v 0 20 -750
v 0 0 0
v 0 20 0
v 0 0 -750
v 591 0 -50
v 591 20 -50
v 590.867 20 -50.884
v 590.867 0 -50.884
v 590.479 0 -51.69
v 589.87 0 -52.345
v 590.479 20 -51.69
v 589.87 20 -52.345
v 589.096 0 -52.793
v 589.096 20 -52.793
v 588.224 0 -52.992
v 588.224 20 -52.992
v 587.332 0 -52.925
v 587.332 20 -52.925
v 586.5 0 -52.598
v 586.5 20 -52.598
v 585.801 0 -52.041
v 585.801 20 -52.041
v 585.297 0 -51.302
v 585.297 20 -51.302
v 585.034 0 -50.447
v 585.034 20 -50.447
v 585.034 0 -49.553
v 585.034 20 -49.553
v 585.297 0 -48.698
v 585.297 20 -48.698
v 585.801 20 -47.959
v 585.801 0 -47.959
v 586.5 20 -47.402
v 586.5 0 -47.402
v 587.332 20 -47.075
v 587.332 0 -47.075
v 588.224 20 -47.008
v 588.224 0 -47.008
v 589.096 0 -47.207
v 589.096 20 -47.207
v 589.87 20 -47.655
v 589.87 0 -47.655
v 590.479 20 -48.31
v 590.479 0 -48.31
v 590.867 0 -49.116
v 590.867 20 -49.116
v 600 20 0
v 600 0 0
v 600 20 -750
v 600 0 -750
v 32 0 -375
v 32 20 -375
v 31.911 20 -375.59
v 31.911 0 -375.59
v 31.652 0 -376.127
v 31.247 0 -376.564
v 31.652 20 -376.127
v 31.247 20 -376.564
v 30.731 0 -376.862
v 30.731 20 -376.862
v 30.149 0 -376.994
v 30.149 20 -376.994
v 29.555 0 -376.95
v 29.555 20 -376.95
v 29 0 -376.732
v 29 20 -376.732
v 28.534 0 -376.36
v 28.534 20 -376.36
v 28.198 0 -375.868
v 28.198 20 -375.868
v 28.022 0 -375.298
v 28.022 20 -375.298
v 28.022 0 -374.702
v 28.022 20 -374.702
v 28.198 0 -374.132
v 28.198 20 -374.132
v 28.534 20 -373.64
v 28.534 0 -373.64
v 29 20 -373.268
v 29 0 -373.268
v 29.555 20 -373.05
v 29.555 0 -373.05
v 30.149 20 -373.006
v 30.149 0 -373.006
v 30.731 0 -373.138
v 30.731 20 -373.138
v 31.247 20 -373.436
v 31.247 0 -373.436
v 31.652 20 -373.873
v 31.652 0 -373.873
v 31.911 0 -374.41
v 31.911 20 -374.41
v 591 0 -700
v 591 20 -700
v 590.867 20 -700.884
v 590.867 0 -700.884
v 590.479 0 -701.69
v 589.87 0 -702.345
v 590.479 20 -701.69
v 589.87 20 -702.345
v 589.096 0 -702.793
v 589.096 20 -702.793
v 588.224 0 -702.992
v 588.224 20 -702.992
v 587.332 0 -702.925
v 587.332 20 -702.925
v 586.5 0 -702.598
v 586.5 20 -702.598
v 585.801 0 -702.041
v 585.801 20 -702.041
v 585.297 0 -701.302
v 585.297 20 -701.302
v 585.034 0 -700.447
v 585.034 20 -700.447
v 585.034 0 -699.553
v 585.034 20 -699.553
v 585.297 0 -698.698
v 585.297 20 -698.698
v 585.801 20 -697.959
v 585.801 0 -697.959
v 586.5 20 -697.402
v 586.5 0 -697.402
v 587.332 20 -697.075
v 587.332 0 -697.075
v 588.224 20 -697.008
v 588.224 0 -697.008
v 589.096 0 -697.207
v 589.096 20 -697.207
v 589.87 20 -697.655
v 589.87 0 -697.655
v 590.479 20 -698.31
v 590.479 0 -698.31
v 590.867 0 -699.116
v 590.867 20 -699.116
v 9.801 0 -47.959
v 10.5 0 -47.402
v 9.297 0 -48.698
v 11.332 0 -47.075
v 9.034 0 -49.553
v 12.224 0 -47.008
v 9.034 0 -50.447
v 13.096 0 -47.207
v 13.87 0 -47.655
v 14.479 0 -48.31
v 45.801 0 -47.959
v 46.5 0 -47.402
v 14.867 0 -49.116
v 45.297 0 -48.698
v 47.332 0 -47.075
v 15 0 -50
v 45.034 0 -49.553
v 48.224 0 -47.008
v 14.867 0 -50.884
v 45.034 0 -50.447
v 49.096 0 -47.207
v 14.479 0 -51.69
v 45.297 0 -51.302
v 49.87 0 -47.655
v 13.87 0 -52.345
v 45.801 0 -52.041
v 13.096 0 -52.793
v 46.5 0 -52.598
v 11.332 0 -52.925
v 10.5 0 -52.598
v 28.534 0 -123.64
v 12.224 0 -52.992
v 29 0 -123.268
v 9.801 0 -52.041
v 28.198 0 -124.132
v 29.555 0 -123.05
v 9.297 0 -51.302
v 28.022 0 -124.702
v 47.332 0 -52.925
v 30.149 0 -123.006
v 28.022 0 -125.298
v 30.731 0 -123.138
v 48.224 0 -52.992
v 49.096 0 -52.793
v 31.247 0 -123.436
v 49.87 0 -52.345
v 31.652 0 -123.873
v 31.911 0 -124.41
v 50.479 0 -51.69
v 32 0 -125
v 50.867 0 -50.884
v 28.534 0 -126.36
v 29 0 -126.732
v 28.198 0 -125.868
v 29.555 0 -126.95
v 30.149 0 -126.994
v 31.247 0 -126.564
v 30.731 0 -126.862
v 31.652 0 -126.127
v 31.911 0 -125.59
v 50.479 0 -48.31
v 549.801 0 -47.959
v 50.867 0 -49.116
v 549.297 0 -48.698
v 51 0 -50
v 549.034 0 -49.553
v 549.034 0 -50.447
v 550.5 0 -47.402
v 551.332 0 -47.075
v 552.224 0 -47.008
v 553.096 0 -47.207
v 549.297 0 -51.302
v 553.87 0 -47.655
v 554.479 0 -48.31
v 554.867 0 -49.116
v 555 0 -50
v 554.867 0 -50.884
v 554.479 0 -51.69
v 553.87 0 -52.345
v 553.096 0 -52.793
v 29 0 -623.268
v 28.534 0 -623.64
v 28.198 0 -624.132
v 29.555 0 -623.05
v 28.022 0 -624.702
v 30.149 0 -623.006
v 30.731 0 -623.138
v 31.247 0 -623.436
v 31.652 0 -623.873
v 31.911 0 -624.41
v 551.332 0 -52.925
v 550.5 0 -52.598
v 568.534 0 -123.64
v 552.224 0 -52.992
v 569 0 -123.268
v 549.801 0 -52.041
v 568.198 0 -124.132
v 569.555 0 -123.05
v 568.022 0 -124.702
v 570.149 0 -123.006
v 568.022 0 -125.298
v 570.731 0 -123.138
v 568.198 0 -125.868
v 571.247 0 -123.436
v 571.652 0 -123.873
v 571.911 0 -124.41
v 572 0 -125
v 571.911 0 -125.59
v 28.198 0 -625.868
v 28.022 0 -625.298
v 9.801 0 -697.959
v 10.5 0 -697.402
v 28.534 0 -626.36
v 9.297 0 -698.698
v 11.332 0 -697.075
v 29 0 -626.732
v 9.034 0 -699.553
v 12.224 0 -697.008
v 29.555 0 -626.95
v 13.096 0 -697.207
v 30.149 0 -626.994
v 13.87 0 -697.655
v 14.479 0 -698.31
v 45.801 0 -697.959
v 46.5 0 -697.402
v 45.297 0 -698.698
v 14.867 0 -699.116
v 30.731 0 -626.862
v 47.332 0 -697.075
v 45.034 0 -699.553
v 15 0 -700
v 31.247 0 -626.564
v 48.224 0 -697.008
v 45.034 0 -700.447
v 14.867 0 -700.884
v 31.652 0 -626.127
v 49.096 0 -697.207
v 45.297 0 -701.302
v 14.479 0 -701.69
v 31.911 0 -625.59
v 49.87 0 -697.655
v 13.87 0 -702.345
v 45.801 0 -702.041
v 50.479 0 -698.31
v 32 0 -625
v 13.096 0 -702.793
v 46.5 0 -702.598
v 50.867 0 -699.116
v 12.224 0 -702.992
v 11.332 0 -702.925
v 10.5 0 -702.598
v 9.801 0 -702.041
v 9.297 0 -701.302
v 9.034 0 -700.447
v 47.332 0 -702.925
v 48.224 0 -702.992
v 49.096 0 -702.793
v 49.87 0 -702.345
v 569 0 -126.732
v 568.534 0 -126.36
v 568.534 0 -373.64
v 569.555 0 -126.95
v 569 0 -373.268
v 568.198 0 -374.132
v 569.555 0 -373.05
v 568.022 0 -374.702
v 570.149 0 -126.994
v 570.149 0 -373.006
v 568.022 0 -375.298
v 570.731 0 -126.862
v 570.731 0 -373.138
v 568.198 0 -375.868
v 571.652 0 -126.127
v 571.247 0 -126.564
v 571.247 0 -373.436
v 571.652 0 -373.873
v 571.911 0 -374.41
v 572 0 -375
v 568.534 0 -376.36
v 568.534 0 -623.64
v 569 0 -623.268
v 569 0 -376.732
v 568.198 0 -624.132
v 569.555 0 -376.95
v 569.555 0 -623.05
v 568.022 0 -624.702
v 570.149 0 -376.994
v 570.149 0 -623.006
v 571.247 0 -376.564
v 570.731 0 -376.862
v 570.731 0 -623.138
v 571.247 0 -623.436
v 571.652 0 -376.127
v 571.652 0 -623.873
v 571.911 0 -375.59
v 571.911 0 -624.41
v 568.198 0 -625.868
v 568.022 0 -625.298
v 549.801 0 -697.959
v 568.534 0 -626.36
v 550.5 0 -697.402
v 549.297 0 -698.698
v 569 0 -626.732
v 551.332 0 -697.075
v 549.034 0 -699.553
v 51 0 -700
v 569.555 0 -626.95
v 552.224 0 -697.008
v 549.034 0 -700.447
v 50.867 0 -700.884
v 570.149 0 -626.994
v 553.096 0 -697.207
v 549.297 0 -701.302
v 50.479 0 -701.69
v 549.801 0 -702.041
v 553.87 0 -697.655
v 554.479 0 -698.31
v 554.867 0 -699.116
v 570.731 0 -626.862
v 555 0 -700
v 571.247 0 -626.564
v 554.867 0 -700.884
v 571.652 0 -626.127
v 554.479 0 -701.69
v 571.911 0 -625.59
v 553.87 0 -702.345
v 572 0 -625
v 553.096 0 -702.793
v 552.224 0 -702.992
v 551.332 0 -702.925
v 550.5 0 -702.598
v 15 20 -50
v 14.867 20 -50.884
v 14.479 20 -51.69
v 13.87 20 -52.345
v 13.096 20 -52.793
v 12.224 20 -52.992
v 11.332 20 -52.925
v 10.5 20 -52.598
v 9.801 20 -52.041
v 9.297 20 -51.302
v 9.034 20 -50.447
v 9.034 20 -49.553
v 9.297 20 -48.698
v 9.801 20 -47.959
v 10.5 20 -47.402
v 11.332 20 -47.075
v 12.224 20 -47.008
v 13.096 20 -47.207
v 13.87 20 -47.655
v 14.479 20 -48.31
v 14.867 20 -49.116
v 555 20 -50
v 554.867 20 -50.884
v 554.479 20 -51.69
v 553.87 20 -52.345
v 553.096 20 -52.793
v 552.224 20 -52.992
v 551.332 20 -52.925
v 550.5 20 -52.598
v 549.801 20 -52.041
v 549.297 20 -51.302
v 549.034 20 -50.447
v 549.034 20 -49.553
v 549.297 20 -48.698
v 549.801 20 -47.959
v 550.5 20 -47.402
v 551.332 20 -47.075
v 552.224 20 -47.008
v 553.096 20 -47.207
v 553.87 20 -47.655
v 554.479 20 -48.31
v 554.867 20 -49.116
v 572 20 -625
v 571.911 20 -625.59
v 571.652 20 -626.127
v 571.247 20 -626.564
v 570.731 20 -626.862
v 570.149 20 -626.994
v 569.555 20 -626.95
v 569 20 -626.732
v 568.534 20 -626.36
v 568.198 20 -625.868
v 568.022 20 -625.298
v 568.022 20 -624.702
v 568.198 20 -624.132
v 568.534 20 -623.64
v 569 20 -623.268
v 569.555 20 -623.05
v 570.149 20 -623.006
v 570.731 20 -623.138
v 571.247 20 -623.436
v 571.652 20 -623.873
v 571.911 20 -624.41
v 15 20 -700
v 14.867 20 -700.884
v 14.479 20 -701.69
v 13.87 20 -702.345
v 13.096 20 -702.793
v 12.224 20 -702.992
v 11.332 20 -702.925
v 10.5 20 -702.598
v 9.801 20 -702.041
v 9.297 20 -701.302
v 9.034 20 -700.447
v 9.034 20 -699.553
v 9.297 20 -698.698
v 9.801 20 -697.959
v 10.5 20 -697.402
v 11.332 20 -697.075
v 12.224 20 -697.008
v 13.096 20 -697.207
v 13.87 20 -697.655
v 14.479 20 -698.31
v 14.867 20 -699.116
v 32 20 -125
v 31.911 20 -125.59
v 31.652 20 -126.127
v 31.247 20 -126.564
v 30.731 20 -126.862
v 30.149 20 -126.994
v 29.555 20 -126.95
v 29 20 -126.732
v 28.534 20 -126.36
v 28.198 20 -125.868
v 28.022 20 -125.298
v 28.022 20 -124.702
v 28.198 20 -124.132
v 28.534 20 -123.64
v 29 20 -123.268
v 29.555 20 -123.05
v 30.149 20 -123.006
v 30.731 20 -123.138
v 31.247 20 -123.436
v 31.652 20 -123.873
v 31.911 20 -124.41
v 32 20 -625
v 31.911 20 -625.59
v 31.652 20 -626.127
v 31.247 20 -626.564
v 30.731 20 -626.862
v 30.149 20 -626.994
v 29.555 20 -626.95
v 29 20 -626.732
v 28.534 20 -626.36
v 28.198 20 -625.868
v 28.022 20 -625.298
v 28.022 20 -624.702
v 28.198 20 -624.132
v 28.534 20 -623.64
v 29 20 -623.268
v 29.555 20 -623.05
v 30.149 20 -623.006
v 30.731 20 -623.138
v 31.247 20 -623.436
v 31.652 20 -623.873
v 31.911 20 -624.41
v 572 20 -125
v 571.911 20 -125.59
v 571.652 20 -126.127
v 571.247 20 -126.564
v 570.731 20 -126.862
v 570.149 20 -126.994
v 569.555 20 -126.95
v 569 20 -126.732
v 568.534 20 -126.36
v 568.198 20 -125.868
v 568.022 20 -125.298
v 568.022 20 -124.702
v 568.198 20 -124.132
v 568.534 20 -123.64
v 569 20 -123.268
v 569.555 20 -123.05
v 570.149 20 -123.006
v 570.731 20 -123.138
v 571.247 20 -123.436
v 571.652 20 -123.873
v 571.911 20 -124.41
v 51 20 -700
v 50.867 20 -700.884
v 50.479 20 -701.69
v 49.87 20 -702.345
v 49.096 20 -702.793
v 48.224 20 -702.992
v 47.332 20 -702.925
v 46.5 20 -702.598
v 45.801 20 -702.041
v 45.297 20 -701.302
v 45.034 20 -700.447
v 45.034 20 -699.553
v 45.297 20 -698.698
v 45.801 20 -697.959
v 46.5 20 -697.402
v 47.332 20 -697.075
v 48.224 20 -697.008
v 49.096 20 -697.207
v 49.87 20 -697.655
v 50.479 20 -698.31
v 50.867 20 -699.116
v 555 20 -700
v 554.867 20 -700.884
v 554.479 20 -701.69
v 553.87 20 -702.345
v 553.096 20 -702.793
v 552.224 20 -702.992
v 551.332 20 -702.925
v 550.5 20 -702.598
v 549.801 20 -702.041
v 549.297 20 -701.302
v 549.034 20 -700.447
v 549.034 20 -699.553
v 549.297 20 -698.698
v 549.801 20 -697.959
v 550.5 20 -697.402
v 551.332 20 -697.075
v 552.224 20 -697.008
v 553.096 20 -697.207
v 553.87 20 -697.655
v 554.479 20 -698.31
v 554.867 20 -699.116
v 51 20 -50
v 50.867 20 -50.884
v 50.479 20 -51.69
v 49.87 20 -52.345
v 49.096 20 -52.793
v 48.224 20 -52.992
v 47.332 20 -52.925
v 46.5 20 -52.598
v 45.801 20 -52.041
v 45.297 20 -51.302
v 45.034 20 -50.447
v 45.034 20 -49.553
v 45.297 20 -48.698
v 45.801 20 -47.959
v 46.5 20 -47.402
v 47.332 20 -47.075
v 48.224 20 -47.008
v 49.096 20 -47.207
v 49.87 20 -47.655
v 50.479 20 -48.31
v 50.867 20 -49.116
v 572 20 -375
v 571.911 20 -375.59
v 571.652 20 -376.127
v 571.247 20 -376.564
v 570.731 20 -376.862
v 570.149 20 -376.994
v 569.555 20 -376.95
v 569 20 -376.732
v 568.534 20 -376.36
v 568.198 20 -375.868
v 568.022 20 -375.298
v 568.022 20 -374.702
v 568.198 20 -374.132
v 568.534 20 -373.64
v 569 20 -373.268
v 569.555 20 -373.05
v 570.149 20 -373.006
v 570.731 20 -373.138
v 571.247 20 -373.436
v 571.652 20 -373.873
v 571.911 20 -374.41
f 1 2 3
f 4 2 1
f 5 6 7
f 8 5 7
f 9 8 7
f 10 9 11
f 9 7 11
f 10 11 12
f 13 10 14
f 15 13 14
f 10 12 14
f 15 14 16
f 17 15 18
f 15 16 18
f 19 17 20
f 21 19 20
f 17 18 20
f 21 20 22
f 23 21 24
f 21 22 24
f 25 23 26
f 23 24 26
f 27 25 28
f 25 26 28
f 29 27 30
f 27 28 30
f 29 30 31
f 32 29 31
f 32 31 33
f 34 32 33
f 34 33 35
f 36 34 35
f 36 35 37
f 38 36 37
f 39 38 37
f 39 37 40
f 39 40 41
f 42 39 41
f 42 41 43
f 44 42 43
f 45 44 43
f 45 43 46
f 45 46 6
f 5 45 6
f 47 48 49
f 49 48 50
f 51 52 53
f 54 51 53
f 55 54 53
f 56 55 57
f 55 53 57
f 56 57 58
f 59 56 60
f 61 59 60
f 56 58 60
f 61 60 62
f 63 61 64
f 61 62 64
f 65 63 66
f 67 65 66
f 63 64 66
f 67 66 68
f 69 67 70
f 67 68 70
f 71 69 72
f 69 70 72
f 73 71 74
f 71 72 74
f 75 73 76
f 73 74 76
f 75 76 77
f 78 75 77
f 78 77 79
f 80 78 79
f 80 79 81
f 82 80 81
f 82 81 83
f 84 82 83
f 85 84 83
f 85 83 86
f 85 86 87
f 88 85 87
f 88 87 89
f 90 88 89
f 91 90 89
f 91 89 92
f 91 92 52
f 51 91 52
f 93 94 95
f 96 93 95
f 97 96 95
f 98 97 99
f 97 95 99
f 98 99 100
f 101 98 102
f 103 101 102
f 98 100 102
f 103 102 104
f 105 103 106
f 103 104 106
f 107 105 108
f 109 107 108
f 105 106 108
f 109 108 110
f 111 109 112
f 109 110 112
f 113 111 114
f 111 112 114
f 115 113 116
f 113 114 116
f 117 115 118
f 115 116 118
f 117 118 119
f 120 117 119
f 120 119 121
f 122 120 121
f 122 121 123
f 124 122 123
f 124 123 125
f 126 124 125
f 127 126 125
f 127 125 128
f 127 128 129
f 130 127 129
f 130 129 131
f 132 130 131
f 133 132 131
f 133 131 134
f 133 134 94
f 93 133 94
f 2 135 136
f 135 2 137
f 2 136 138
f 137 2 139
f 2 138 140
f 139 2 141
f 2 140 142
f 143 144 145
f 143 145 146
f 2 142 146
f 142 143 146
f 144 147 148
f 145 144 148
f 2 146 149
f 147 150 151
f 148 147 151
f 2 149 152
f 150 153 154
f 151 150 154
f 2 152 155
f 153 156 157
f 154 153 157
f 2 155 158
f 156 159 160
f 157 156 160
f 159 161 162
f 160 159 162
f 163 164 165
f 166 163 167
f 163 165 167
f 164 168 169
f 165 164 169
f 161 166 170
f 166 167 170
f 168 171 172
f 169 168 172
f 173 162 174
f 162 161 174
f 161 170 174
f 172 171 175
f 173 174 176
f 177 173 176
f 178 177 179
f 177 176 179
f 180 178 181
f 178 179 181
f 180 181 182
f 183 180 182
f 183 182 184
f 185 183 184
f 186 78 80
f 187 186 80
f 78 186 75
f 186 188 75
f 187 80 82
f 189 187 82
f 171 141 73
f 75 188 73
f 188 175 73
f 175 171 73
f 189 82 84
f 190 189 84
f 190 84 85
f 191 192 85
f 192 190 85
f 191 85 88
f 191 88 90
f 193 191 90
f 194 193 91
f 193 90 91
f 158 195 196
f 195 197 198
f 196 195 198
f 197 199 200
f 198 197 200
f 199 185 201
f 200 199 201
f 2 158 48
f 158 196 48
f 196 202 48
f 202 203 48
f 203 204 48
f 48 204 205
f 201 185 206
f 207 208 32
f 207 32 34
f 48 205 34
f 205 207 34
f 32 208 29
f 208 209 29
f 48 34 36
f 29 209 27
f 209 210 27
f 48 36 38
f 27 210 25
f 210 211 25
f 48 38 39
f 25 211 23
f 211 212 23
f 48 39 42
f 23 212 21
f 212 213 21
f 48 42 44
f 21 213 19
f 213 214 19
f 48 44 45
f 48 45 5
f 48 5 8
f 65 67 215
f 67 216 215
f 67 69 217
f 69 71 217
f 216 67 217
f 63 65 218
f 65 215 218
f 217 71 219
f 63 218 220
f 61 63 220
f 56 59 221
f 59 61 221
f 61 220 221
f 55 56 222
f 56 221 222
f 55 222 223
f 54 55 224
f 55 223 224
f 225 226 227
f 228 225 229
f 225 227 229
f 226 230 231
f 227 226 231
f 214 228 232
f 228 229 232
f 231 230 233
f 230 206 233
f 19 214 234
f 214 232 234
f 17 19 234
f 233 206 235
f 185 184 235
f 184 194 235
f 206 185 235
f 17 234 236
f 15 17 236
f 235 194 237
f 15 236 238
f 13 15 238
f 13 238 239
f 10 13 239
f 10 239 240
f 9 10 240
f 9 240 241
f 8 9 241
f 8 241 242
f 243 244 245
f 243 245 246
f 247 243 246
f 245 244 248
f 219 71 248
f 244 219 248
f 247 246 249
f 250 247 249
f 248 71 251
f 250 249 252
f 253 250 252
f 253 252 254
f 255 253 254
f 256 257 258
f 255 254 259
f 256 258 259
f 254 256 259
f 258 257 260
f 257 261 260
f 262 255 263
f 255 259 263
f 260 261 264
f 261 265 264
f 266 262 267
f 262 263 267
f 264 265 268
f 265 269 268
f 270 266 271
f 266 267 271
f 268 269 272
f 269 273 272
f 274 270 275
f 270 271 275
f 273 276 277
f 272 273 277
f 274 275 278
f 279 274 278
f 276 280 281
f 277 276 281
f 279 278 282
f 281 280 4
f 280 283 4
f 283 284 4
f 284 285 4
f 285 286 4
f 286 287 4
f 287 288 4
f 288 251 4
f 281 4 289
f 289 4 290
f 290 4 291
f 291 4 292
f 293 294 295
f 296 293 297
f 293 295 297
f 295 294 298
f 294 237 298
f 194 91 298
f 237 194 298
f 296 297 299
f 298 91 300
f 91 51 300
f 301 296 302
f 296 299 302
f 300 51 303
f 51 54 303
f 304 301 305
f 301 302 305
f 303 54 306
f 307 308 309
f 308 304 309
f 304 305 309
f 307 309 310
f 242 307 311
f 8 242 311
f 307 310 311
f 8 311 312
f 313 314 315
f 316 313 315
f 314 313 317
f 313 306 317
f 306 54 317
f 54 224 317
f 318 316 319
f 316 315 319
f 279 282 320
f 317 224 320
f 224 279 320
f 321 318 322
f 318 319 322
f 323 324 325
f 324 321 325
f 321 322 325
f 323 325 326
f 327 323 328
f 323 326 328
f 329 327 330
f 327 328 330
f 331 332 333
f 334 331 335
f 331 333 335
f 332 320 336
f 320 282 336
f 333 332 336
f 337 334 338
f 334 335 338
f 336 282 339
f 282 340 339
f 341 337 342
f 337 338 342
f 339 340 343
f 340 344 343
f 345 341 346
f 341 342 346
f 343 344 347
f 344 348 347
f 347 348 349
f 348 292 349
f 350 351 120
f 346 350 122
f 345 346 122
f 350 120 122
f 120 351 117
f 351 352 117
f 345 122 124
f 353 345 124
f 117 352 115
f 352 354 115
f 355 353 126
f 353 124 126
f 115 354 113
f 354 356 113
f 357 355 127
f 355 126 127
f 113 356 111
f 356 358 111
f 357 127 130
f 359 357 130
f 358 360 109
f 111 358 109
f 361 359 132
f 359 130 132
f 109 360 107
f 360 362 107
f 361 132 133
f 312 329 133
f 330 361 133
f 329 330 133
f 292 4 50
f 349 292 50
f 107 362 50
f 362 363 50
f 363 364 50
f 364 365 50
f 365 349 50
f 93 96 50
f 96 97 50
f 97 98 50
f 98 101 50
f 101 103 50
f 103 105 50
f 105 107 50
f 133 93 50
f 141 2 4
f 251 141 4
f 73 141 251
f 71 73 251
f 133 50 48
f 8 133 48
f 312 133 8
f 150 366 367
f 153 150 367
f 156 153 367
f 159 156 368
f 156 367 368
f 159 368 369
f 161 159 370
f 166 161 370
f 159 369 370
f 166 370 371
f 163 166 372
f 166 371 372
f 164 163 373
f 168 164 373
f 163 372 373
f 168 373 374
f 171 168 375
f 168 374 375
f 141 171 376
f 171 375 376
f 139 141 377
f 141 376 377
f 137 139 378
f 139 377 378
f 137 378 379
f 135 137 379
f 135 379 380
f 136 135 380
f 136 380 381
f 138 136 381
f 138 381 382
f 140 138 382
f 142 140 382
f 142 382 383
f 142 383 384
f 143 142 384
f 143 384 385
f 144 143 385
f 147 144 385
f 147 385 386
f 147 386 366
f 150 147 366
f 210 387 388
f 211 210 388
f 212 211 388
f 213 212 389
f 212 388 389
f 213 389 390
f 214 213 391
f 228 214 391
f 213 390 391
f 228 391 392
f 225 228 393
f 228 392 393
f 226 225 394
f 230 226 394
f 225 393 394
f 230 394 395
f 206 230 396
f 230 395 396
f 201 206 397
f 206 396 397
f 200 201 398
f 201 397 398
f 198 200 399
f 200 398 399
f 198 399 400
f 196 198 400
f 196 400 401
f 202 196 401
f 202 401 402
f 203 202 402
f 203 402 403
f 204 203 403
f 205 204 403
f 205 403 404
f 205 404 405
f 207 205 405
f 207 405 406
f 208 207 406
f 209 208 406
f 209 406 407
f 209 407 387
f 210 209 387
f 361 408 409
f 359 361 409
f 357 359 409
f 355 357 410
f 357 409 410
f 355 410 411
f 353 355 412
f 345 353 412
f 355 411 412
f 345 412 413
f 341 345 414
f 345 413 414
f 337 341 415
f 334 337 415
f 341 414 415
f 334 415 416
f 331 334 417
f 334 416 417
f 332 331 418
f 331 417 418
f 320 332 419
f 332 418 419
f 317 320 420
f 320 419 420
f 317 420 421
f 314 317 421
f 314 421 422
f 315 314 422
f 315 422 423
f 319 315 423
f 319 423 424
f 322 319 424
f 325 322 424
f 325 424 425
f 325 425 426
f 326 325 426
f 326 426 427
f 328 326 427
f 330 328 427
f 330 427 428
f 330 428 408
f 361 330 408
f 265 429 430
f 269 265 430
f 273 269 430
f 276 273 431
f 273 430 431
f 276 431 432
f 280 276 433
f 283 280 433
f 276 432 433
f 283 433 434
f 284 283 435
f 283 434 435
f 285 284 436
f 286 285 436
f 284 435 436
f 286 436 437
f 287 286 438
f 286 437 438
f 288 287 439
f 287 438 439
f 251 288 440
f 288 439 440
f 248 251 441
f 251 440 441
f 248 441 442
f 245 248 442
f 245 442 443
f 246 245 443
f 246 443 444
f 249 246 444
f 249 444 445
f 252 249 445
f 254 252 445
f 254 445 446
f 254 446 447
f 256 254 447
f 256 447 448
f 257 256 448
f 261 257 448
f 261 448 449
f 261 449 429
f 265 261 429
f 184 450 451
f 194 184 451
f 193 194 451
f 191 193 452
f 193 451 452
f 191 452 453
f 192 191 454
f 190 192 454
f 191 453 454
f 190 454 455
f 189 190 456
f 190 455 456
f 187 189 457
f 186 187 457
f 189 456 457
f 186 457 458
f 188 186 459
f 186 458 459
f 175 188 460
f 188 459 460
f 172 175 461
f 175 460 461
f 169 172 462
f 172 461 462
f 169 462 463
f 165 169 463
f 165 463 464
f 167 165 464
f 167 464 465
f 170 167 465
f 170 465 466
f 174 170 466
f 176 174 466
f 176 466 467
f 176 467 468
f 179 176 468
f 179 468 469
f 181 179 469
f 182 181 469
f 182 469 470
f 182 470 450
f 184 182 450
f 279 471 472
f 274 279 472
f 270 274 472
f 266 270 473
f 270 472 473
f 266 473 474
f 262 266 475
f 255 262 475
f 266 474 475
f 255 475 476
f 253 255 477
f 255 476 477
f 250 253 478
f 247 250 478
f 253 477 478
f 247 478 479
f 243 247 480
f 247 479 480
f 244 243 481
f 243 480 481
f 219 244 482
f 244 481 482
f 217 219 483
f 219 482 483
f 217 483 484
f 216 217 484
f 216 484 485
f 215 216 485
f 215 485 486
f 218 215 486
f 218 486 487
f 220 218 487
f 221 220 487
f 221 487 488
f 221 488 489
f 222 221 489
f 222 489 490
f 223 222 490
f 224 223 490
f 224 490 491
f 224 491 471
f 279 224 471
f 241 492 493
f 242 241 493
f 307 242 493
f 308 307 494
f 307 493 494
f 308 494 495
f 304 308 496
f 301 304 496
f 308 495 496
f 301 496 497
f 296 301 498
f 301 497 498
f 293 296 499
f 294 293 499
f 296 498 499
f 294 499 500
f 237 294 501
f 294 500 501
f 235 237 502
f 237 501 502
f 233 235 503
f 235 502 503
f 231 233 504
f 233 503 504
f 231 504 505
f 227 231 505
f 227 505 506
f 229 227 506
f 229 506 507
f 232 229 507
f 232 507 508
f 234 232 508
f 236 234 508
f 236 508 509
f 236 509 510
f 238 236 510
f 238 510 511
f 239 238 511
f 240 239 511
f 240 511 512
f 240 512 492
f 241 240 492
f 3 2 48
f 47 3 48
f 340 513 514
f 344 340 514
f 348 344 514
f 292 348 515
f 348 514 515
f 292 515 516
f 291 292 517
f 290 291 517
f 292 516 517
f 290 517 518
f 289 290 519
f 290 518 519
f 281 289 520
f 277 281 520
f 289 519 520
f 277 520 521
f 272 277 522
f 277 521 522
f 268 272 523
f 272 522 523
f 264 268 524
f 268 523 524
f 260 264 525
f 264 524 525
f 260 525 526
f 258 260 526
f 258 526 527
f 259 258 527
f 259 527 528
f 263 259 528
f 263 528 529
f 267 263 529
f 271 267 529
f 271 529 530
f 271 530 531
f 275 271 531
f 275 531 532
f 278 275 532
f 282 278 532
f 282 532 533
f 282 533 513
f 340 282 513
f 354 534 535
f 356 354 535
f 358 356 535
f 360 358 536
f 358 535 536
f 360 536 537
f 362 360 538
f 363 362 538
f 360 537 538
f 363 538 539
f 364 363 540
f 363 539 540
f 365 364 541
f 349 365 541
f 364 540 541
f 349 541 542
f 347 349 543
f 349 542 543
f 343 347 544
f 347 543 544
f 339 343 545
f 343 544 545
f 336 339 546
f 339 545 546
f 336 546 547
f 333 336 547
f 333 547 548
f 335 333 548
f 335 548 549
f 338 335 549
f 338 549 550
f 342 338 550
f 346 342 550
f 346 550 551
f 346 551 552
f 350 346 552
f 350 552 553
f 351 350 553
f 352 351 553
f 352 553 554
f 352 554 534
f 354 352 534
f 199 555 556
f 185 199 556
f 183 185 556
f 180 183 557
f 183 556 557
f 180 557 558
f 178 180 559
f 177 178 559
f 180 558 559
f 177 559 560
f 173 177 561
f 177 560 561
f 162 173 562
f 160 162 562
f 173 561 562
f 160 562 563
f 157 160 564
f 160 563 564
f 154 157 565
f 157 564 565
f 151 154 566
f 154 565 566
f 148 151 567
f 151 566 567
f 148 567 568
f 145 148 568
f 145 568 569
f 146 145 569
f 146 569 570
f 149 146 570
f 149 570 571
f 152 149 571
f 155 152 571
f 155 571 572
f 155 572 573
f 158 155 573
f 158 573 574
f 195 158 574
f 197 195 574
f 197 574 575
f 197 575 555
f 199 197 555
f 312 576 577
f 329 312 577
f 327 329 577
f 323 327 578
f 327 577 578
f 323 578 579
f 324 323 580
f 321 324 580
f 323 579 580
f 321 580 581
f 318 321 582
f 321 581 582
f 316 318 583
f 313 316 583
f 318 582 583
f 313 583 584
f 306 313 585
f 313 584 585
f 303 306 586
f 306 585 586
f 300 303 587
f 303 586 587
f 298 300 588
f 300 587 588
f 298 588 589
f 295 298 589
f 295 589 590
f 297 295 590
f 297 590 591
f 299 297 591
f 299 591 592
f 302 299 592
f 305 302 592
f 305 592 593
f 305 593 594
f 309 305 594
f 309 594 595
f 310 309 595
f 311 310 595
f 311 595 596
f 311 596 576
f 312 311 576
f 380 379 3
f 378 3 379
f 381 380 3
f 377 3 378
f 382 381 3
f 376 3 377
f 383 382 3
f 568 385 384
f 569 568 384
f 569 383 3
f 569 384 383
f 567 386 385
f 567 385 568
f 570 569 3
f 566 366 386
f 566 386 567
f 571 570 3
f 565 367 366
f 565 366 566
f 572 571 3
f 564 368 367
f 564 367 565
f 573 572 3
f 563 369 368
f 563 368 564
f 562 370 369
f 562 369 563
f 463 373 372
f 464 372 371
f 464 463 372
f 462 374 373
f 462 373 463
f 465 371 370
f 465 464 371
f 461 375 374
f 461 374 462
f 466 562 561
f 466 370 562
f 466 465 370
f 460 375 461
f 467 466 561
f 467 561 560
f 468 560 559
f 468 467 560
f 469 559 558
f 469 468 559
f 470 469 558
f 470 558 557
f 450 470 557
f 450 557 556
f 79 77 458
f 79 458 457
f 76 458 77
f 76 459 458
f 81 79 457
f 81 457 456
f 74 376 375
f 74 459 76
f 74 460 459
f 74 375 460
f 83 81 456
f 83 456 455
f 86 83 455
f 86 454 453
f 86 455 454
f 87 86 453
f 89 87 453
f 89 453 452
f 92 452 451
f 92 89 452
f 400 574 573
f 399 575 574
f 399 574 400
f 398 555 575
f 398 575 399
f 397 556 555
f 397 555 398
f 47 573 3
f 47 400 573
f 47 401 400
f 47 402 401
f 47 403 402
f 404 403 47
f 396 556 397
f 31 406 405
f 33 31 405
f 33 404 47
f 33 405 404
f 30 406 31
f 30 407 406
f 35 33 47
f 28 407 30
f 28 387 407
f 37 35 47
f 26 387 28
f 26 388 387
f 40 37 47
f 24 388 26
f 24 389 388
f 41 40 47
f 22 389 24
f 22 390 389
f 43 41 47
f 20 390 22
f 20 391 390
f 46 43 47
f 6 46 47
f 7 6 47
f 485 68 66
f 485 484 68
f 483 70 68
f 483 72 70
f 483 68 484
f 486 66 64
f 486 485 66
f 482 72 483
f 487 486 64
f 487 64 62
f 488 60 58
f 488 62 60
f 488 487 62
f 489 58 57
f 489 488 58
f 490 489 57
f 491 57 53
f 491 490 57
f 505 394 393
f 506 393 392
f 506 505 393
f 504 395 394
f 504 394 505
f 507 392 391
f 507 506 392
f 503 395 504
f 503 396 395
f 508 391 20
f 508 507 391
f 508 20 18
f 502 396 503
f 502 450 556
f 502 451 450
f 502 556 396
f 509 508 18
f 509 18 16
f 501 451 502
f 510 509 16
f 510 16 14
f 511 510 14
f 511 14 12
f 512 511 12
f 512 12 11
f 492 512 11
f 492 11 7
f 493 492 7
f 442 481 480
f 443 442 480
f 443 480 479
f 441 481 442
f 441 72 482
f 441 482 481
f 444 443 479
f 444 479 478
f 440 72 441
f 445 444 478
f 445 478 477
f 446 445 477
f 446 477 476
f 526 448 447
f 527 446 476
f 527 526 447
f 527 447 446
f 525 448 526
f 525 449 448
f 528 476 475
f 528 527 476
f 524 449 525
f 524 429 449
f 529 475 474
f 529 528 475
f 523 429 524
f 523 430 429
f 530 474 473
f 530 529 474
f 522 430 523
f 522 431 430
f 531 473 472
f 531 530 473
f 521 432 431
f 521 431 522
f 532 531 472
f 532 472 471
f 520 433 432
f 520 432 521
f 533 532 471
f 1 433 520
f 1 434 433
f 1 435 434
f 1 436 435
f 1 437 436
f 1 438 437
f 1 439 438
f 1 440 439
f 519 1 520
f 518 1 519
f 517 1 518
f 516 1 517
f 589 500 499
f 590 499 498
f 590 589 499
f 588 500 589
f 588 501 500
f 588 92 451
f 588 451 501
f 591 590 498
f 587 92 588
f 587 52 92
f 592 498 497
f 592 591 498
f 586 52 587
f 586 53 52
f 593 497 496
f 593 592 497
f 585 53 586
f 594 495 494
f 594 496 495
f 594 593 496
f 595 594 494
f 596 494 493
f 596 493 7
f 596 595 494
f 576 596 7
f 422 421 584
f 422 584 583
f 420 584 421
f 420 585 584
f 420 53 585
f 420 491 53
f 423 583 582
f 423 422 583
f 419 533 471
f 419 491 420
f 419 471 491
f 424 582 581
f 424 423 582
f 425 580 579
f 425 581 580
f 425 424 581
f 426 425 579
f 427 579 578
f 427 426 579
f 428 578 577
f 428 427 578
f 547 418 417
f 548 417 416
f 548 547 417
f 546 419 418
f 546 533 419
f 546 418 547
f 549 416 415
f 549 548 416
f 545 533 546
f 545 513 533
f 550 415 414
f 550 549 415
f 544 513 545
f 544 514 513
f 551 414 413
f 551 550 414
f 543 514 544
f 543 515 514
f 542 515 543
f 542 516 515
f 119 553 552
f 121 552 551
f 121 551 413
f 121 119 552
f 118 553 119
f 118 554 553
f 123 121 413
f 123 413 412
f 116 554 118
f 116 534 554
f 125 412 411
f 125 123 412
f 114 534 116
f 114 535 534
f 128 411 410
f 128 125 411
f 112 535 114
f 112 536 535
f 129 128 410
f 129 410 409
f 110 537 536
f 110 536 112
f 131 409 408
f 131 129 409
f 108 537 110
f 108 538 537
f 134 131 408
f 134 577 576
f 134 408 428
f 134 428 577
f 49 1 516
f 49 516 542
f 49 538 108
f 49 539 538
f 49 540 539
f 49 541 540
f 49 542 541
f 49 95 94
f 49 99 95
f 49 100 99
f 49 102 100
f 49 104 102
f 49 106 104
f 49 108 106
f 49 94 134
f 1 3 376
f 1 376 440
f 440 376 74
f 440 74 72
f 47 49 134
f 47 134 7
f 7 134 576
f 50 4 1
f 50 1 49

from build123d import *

# Parameters (mm, degrees)
SKETCH1_W           = 600
SKETCH1_H           = 750
BOSS_EXTRUDE1_DEPTH = 20
SKETCH5_R           = 3
CUT_EXTRUDE3_DEPTH  = 21
SKETCH6_R           = 2
CUT_EXTRUDE4_DEPTH  = 21


with BuildPart() as part:
    # Sketch1 → Boss-Extrude1 (new body)
    with BuildSketch(Plane(origin=(0, 0, 0), x_dir=(1, 0, 0), z_dir=(0, 1, 0))):
        with Locations((300, 375)):
            Rectangle(SKETCH1_W, SKETCH1_H)
    extrude(amount=BOSS_EXTRUDE1_DEPTH)

    # Sketch5 → Cut-Extrude3 (cut, through all)
    with BuildSketch(Plane(origin=(0, 20, 0), x_dir=(1, 0, 0), z_dir=(0, 1, 0))):
        with Locations((48, 50)):
            Circle(SKETCH5_R)
        with Locations((12, 50)):
            Circle(SKETCH5_R)
        with Locations((48, 700)):
            Circle(SKETCH5_R)
        with Locations((12, 700)):
            Circle(SKETCH5_R)
        with Locations((552, 50)):
            Circle(SKETCH5_R)
        with Locations((588, 50)):
            Circle(SKETCH5_R)
        with Locations((552, 700)):
            Circle(SKETCH5_R)
        with Locations((588, 700)):
            Circle(SKETCH5_R)
    extrude(amount=-CUT_EXTRUDE3_DEPTH, mode=Mode.SUBTRACT)

    # Sketch6 → Cut-Extrude4 (cut, through all)
    with BuildSketch(Plane(origin=(0, 20, 0), x_dir=(1, 0, 0), z_dir=(0, 1, 0))):
        with Locations((30, 625)):
            Circle(SKETCH6_R)
        with Locations((570, 625)):
            Circle(SKETCH6_R)
        with Locations((570, 375)):
            Circle(SKETCH6_R)
        with Locations((30, 375)):
            Circle(SKETCH6_R)
        with Locations((30, 125)):
            Circle(SKETCH6_R)
        with Locations((570, 125)):
            Circle(SKETCH6_R)
    extrude(amount=-CUT_EXTRUDE4_DEPTH, mode=Mode.SUBTRACT)


solid = part.part
